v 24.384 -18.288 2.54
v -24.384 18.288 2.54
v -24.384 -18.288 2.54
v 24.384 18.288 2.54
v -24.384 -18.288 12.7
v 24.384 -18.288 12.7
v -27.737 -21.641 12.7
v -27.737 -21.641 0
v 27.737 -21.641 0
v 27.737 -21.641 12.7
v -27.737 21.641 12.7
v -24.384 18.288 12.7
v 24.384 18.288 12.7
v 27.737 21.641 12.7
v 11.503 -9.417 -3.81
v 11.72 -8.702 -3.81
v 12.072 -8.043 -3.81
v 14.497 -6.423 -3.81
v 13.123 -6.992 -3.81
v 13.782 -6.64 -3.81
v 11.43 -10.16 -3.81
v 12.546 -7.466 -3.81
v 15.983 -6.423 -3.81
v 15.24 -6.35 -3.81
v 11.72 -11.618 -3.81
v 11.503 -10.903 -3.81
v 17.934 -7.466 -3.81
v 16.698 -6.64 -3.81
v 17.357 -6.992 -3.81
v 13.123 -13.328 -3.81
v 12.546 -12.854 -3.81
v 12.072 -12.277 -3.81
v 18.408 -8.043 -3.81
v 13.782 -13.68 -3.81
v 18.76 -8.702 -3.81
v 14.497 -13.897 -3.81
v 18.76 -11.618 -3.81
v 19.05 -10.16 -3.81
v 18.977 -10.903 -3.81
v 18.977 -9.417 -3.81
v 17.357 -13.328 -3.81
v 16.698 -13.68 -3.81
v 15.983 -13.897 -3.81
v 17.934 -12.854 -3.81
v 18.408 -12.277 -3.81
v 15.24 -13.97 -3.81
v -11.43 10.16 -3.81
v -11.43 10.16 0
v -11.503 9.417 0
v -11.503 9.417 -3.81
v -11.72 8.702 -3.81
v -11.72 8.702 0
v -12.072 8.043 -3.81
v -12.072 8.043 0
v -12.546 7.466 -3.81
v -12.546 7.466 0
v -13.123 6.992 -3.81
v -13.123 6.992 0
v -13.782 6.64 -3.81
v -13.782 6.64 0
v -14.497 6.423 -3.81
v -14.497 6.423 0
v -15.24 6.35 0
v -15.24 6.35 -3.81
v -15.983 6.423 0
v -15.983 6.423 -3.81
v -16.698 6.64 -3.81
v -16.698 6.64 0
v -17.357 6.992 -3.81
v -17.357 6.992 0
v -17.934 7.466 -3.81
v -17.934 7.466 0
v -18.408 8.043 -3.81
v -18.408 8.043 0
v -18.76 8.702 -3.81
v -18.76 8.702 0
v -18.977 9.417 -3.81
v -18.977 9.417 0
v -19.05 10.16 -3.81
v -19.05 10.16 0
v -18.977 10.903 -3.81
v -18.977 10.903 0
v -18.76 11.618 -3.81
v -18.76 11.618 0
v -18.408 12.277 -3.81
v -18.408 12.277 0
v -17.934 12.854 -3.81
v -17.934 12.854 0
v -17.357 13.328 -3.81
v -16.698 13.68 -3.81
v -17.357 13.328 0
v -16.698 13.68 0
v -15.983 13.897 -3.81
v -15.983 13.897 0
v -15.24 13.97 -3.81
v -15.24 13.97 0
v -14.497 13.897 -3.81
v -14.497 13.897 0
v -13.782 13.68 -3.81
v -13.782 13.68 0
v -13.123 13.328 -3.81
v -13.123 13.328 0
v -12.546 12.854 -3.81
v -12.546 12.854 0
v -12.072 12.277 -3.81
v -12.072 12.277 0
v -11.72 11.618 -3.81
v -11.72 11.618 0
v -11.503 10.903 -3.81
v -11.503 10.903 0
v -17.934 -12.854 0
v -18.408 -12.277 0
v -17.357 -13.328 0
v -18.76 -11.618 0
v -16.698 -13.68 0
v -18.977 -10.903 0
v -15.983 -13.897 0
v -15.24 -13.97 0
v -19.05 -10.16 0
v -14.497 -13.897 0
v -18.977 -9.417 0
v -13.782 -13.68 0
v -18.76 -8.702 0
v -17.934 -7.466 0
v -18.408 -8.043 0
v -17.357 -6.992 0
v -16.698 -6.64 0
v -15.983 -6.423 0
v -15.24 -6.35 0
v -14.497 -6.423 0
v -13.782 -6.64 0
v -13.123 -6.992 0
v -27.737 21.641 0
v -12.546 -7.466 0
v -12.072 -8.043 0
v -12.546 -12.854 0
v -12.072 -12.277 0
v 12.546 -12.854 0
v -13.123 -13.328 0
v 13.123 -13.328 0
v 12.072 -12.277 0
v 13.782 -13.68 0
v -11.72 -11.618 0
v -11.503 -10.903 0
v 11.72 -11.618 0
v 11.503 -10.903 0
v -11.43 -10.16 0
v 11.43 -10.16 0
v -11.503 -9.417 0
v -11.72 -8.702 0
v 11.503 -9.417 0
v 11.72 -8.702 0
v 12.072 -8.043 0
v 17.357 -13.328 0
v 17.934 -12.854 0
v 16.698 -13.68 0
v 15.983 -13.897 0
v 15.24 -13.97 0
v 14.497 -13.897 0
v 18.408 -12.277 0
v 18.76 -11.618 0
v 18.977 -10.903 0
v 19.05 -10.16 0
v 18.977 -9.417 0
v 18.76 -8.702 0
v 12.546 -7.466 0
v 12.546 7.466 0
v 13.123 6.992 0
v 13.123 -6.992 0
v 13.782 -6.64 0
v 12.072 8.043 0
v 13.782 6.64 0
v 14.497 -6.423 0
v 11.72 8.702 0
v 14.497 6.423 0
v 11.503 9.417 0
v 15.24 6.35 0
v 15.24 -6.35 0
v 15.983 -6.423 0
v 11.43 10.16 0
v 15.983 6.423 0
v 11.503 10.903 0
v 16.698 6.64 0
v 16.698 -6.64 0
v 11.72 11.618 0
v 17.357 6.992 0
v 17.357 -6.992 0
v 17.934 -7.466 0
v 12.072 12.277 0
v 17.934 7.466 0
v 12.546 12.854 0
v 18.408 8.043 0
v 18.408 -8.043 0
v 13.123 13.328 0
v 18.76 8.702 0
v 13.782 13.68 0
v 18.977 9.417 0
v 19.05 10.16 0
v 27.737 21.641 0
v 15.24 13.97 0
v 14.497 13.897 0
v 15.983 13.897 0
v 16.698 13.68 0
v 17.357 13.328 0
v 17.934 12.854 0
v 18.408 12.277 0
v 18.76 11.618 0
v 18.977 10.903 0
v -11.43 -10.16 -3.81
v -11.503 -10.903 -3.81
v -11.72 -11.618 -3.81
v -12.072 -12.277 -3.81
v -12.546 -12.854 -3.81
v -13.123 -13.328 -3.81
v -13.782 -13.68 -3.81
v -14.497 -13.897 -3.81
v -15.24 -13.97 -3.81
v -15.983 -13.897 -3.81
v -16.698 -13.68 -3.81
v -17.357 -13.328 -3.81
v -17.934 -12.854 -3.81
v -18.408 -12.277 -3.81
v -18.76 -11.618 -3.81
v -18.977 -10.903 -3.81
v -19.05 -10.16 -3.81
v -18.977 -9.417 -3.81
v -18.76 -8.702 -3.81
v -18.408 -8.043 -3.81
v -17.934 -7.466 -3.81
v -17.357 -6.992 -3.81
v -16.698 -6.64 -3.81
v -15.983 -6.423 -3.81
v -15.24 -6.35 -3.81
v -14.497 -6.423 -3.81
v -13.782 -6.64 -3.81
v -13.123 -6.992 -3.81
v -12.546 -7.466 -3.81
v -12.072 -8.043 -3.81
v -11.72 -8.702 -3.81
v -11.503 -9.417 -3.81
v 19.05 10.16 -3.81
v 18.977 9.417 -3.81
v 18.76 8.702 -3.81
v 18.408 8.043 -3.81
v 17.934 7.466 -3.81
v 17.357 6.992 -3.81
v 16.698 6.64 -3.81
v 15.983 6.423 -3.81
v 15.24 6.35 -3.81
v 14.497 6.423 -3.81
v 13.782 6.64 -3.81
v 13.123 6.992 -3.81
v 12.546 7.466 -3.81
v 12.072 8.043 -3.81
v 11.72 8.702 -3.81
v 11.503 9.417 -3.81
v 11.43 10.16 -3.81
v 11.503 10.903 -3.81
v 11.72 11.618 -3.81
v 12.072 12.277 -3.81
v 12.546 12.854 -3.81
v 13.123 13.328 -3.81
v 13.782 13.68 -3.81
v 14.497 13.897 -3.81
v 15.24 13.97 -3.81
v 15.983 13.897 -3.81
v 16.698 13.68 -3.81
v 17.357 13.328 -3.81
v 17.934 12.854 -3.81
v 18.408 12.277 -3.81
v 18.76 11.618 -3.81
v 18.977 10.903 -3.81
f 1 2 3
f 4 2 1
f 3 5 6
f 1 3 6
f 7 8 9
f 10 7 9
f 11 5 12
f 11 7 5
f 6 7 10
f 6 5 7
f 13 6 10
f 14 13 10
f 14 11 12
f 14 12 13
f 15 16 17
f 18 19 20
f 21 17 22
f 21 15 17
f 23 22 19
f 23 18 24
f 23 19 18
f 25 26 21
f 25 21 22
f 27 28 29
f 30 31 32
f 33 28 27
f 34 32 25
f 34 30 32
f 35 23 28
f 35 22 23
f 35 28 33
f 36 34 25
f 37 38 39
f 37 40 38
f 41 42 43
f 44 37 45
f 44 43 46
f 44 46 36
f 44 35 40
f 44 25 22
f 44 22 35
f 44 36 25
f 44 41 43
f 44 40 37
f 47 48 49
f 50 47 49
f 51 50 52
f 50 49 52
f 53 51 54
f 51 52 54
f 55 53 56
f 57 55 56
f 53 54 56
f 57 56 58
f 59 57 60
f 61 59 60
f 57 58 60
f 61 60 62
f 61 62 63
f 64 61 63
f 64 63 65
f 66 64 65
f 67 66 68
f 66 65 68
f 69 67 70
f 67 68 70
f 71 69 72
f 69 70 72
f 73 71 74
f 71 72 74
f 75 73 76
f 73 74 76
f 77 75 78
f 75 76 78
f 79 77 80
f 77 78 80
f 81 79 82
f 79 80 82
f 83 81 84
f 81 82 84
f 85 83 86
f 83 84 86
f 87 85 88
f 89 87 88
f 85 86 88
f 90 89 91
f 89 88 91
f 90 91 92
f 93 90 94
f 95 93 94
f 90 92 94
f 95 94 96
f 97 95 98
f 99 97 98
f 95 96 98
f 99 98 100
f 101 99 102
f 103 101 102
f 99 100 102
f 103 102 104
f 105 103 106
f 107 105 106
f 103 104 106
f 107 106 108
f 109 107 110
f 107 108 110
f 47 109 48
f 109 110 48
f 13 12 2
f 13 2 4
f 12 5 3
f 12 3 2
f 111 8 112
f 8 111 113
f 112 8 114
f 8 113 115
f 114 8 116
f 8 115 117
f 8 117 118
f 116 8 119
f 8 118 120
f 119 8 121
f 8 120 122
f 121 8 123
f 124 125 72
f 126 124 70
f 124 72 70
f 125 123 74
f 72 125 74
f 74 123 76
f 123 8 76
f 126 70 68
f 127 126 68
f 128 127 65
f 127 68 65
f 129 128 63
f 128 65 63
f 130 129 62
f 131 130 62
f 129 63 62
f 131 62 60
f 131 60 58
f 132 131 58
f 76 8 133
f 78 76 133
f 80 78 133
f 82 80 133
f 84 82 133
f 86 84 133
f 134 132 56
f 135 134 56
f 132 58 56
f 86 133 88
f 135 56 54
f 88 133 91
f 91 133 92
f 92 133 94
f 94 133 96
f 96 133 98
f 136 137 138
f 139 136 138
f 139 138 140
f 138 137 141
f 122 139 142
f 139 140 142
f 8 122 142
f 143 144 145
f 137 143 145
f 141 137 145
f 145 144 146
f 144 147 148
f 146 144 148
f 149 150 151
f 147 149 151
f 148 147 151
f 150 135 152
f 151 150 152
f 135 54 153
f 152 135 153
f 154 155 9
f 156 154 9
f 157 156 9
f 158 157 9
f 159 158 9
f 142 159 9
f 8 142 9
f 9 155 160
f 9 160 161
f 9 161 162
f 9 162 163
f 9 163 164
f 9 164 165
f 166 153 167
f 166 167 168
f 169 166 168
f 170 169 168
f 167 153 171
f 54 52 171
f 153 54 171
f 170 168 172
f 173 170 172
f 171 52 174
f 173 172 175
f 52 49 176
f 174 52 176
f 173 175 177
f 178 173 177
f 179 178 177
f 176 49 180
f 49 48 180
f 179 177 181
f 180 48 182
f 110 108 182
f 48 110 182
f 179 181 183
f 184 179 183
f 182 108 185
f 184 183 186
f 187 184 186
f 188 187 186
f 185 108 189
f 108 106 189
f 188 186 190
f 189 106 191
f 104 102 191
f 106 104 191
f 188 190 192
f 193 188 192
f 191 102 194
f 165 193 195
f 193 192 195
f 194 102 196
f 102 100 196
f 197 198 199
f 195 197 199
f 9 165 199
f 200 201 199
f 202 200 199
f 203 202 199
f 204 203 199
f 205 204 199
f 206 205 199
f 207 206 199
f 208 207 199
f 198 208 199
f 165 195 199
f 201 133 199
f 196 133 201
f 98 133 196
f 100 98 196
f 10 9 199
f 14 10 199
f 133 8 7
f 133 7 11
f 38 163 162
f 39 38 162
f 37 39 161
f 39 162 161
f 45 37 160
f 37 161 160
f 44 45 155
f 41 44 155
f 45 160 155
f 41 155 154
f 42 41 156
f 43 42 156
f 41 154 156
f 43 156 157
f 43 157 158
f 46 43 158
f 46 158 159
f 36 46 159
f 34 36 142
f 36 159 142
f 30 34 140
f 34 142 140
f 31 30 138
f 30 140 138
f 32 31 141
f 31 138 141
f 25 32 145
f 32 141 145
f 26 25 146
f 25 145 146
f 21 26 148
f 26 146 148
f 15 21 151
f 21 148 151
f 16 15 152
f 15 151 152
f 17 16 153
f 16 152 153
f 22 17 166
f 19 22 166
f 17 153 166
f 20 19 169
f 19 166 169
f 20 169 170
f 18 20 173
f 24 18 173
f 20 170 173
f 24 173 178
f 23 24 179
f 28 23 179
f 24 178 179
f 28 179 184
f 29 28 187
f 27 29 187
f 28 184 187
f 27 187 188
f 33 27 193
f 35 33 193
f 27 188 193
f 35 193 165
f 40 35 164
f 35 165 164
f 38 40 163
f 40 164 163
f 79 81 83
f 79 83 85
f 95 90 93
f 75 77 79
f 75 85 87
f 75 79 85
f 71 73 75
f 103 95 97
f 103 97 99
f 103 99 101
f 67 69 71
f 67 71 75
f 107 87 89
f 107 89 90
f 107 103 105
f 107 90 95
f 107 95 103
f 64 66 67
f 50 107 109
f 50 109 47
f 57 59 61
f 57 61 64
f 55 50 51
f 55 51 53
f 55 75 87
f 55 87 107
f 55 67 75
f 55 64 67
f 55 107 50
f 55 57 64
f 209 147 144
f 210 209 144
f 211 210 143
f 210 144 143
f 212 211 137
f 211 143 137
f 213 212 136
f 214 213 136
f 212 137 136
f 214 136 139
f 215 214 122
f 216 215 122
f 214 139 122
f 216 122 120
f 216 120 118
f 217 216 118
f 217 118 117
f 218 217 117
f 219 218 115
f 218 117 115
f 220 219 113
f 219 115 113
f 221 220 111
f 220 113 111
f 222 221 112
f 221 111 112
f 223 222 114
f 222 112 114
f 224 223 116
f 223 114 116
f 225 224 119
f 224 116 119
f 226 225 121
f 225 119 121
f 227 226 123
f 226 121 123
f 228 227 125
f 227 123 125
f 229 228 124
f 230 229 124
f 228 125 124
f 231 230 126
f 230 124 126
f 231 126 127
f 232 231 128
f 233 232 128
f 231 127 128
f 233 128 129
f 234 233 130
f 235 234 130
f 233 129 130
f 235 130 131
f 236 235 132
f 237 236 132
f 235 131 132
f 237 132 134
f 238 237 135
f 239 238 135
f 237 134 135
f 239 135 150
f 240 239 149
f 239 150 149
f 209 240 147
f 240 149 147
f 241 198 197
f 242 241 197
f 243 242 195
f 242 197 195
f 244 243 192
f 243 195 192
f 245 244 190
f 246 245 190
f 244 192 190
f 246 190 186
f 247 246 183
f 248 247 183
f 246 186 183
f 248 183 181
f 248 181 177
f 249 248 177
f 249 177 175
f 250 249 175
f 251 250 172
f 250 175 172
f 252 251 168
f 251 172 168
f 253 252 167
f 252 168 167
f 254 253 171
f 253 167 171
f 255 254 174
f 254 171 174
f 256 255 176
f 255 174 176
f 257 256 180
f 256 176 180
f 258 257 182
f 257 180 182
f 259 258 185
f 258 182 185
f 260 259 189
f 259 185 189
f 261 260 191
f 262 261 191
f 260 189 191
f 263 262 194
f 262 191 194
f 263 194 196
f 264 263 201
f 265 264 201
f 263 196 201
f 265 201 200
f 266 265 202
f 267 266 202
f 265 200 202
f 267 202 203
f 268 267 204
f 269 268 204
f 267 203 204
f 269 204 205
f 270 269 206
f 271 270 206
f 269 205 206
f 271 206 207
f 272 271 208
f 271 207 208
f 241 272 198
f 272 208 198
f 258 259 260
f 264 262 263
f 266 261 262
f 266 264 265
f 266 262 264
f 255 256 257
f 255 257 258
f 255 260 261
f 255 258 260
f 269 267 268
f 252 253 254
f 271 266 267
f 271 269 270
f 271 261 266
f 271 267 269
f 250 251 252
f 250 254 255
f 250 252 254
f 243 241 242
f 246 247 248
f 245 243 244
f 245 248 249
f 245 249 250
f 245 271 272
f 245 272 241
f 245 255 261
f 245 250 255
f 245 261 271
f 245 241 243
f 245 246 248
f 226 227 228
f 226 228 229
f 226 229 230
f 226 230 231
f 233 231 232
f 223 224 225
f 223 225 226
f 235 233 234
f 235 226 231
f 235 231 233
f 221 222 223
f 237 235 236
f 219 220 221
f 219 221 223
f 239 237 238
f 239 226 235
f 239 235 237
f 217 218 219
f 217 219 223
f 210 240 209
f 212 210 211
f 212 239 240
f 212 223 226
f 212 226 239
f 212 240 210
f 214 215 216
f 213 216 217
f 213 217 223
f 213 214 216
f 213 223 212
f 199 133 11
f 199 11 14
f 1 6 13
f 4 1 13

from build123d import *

# Parameters (mm, degrees)
F0_W     = 55.4736
F0_H     = 43.2816
F1_DEPTH = 12.7
F2_W     = 48.768
F2_H     = 36.576
F3_DEPTH = 10.16
F4_R     = 3.81
F5_DEPTH = 3.81


# Not quite as in the source:
# - a feature names something its author has since deleted; it is built from what else it names


with BuildPart() as f1:
    # F0 (on Top) → F1 (new body)
    with BuildSketch(Plane.XY):
        Rectangle(F0_W, F0_H)
    extrude(amount=F1_DEPTH)

    # F2 (on face) → F3 (cut)
    with BuildSketch(Plane.XY.offset(12.7)):
        Rectangle(F2_W, F2_H)
    extrude(amount=-F3_DEPTH, mode=Mode.SUBTRACT)

    # F4 (on face) → F5 (join)
    with BuildSketch(Plane(origin=(0, 0, 0), x_dir=(1, 0, 0), z_dir=(0, 0, -1))):
        with Locations((15.24, -10.16)):
            Circle(F4_R)
        with Locations((-15.24, -10.16)):
            Circle(F4_R)
        with Locations((15.24, 10.16)):
            Circle(F4_R)
        with Locations((-15.24, 10.16)):
            Circle(F4_R)
    extrude(amount=F5_DEPTH)


solid = f1.part
